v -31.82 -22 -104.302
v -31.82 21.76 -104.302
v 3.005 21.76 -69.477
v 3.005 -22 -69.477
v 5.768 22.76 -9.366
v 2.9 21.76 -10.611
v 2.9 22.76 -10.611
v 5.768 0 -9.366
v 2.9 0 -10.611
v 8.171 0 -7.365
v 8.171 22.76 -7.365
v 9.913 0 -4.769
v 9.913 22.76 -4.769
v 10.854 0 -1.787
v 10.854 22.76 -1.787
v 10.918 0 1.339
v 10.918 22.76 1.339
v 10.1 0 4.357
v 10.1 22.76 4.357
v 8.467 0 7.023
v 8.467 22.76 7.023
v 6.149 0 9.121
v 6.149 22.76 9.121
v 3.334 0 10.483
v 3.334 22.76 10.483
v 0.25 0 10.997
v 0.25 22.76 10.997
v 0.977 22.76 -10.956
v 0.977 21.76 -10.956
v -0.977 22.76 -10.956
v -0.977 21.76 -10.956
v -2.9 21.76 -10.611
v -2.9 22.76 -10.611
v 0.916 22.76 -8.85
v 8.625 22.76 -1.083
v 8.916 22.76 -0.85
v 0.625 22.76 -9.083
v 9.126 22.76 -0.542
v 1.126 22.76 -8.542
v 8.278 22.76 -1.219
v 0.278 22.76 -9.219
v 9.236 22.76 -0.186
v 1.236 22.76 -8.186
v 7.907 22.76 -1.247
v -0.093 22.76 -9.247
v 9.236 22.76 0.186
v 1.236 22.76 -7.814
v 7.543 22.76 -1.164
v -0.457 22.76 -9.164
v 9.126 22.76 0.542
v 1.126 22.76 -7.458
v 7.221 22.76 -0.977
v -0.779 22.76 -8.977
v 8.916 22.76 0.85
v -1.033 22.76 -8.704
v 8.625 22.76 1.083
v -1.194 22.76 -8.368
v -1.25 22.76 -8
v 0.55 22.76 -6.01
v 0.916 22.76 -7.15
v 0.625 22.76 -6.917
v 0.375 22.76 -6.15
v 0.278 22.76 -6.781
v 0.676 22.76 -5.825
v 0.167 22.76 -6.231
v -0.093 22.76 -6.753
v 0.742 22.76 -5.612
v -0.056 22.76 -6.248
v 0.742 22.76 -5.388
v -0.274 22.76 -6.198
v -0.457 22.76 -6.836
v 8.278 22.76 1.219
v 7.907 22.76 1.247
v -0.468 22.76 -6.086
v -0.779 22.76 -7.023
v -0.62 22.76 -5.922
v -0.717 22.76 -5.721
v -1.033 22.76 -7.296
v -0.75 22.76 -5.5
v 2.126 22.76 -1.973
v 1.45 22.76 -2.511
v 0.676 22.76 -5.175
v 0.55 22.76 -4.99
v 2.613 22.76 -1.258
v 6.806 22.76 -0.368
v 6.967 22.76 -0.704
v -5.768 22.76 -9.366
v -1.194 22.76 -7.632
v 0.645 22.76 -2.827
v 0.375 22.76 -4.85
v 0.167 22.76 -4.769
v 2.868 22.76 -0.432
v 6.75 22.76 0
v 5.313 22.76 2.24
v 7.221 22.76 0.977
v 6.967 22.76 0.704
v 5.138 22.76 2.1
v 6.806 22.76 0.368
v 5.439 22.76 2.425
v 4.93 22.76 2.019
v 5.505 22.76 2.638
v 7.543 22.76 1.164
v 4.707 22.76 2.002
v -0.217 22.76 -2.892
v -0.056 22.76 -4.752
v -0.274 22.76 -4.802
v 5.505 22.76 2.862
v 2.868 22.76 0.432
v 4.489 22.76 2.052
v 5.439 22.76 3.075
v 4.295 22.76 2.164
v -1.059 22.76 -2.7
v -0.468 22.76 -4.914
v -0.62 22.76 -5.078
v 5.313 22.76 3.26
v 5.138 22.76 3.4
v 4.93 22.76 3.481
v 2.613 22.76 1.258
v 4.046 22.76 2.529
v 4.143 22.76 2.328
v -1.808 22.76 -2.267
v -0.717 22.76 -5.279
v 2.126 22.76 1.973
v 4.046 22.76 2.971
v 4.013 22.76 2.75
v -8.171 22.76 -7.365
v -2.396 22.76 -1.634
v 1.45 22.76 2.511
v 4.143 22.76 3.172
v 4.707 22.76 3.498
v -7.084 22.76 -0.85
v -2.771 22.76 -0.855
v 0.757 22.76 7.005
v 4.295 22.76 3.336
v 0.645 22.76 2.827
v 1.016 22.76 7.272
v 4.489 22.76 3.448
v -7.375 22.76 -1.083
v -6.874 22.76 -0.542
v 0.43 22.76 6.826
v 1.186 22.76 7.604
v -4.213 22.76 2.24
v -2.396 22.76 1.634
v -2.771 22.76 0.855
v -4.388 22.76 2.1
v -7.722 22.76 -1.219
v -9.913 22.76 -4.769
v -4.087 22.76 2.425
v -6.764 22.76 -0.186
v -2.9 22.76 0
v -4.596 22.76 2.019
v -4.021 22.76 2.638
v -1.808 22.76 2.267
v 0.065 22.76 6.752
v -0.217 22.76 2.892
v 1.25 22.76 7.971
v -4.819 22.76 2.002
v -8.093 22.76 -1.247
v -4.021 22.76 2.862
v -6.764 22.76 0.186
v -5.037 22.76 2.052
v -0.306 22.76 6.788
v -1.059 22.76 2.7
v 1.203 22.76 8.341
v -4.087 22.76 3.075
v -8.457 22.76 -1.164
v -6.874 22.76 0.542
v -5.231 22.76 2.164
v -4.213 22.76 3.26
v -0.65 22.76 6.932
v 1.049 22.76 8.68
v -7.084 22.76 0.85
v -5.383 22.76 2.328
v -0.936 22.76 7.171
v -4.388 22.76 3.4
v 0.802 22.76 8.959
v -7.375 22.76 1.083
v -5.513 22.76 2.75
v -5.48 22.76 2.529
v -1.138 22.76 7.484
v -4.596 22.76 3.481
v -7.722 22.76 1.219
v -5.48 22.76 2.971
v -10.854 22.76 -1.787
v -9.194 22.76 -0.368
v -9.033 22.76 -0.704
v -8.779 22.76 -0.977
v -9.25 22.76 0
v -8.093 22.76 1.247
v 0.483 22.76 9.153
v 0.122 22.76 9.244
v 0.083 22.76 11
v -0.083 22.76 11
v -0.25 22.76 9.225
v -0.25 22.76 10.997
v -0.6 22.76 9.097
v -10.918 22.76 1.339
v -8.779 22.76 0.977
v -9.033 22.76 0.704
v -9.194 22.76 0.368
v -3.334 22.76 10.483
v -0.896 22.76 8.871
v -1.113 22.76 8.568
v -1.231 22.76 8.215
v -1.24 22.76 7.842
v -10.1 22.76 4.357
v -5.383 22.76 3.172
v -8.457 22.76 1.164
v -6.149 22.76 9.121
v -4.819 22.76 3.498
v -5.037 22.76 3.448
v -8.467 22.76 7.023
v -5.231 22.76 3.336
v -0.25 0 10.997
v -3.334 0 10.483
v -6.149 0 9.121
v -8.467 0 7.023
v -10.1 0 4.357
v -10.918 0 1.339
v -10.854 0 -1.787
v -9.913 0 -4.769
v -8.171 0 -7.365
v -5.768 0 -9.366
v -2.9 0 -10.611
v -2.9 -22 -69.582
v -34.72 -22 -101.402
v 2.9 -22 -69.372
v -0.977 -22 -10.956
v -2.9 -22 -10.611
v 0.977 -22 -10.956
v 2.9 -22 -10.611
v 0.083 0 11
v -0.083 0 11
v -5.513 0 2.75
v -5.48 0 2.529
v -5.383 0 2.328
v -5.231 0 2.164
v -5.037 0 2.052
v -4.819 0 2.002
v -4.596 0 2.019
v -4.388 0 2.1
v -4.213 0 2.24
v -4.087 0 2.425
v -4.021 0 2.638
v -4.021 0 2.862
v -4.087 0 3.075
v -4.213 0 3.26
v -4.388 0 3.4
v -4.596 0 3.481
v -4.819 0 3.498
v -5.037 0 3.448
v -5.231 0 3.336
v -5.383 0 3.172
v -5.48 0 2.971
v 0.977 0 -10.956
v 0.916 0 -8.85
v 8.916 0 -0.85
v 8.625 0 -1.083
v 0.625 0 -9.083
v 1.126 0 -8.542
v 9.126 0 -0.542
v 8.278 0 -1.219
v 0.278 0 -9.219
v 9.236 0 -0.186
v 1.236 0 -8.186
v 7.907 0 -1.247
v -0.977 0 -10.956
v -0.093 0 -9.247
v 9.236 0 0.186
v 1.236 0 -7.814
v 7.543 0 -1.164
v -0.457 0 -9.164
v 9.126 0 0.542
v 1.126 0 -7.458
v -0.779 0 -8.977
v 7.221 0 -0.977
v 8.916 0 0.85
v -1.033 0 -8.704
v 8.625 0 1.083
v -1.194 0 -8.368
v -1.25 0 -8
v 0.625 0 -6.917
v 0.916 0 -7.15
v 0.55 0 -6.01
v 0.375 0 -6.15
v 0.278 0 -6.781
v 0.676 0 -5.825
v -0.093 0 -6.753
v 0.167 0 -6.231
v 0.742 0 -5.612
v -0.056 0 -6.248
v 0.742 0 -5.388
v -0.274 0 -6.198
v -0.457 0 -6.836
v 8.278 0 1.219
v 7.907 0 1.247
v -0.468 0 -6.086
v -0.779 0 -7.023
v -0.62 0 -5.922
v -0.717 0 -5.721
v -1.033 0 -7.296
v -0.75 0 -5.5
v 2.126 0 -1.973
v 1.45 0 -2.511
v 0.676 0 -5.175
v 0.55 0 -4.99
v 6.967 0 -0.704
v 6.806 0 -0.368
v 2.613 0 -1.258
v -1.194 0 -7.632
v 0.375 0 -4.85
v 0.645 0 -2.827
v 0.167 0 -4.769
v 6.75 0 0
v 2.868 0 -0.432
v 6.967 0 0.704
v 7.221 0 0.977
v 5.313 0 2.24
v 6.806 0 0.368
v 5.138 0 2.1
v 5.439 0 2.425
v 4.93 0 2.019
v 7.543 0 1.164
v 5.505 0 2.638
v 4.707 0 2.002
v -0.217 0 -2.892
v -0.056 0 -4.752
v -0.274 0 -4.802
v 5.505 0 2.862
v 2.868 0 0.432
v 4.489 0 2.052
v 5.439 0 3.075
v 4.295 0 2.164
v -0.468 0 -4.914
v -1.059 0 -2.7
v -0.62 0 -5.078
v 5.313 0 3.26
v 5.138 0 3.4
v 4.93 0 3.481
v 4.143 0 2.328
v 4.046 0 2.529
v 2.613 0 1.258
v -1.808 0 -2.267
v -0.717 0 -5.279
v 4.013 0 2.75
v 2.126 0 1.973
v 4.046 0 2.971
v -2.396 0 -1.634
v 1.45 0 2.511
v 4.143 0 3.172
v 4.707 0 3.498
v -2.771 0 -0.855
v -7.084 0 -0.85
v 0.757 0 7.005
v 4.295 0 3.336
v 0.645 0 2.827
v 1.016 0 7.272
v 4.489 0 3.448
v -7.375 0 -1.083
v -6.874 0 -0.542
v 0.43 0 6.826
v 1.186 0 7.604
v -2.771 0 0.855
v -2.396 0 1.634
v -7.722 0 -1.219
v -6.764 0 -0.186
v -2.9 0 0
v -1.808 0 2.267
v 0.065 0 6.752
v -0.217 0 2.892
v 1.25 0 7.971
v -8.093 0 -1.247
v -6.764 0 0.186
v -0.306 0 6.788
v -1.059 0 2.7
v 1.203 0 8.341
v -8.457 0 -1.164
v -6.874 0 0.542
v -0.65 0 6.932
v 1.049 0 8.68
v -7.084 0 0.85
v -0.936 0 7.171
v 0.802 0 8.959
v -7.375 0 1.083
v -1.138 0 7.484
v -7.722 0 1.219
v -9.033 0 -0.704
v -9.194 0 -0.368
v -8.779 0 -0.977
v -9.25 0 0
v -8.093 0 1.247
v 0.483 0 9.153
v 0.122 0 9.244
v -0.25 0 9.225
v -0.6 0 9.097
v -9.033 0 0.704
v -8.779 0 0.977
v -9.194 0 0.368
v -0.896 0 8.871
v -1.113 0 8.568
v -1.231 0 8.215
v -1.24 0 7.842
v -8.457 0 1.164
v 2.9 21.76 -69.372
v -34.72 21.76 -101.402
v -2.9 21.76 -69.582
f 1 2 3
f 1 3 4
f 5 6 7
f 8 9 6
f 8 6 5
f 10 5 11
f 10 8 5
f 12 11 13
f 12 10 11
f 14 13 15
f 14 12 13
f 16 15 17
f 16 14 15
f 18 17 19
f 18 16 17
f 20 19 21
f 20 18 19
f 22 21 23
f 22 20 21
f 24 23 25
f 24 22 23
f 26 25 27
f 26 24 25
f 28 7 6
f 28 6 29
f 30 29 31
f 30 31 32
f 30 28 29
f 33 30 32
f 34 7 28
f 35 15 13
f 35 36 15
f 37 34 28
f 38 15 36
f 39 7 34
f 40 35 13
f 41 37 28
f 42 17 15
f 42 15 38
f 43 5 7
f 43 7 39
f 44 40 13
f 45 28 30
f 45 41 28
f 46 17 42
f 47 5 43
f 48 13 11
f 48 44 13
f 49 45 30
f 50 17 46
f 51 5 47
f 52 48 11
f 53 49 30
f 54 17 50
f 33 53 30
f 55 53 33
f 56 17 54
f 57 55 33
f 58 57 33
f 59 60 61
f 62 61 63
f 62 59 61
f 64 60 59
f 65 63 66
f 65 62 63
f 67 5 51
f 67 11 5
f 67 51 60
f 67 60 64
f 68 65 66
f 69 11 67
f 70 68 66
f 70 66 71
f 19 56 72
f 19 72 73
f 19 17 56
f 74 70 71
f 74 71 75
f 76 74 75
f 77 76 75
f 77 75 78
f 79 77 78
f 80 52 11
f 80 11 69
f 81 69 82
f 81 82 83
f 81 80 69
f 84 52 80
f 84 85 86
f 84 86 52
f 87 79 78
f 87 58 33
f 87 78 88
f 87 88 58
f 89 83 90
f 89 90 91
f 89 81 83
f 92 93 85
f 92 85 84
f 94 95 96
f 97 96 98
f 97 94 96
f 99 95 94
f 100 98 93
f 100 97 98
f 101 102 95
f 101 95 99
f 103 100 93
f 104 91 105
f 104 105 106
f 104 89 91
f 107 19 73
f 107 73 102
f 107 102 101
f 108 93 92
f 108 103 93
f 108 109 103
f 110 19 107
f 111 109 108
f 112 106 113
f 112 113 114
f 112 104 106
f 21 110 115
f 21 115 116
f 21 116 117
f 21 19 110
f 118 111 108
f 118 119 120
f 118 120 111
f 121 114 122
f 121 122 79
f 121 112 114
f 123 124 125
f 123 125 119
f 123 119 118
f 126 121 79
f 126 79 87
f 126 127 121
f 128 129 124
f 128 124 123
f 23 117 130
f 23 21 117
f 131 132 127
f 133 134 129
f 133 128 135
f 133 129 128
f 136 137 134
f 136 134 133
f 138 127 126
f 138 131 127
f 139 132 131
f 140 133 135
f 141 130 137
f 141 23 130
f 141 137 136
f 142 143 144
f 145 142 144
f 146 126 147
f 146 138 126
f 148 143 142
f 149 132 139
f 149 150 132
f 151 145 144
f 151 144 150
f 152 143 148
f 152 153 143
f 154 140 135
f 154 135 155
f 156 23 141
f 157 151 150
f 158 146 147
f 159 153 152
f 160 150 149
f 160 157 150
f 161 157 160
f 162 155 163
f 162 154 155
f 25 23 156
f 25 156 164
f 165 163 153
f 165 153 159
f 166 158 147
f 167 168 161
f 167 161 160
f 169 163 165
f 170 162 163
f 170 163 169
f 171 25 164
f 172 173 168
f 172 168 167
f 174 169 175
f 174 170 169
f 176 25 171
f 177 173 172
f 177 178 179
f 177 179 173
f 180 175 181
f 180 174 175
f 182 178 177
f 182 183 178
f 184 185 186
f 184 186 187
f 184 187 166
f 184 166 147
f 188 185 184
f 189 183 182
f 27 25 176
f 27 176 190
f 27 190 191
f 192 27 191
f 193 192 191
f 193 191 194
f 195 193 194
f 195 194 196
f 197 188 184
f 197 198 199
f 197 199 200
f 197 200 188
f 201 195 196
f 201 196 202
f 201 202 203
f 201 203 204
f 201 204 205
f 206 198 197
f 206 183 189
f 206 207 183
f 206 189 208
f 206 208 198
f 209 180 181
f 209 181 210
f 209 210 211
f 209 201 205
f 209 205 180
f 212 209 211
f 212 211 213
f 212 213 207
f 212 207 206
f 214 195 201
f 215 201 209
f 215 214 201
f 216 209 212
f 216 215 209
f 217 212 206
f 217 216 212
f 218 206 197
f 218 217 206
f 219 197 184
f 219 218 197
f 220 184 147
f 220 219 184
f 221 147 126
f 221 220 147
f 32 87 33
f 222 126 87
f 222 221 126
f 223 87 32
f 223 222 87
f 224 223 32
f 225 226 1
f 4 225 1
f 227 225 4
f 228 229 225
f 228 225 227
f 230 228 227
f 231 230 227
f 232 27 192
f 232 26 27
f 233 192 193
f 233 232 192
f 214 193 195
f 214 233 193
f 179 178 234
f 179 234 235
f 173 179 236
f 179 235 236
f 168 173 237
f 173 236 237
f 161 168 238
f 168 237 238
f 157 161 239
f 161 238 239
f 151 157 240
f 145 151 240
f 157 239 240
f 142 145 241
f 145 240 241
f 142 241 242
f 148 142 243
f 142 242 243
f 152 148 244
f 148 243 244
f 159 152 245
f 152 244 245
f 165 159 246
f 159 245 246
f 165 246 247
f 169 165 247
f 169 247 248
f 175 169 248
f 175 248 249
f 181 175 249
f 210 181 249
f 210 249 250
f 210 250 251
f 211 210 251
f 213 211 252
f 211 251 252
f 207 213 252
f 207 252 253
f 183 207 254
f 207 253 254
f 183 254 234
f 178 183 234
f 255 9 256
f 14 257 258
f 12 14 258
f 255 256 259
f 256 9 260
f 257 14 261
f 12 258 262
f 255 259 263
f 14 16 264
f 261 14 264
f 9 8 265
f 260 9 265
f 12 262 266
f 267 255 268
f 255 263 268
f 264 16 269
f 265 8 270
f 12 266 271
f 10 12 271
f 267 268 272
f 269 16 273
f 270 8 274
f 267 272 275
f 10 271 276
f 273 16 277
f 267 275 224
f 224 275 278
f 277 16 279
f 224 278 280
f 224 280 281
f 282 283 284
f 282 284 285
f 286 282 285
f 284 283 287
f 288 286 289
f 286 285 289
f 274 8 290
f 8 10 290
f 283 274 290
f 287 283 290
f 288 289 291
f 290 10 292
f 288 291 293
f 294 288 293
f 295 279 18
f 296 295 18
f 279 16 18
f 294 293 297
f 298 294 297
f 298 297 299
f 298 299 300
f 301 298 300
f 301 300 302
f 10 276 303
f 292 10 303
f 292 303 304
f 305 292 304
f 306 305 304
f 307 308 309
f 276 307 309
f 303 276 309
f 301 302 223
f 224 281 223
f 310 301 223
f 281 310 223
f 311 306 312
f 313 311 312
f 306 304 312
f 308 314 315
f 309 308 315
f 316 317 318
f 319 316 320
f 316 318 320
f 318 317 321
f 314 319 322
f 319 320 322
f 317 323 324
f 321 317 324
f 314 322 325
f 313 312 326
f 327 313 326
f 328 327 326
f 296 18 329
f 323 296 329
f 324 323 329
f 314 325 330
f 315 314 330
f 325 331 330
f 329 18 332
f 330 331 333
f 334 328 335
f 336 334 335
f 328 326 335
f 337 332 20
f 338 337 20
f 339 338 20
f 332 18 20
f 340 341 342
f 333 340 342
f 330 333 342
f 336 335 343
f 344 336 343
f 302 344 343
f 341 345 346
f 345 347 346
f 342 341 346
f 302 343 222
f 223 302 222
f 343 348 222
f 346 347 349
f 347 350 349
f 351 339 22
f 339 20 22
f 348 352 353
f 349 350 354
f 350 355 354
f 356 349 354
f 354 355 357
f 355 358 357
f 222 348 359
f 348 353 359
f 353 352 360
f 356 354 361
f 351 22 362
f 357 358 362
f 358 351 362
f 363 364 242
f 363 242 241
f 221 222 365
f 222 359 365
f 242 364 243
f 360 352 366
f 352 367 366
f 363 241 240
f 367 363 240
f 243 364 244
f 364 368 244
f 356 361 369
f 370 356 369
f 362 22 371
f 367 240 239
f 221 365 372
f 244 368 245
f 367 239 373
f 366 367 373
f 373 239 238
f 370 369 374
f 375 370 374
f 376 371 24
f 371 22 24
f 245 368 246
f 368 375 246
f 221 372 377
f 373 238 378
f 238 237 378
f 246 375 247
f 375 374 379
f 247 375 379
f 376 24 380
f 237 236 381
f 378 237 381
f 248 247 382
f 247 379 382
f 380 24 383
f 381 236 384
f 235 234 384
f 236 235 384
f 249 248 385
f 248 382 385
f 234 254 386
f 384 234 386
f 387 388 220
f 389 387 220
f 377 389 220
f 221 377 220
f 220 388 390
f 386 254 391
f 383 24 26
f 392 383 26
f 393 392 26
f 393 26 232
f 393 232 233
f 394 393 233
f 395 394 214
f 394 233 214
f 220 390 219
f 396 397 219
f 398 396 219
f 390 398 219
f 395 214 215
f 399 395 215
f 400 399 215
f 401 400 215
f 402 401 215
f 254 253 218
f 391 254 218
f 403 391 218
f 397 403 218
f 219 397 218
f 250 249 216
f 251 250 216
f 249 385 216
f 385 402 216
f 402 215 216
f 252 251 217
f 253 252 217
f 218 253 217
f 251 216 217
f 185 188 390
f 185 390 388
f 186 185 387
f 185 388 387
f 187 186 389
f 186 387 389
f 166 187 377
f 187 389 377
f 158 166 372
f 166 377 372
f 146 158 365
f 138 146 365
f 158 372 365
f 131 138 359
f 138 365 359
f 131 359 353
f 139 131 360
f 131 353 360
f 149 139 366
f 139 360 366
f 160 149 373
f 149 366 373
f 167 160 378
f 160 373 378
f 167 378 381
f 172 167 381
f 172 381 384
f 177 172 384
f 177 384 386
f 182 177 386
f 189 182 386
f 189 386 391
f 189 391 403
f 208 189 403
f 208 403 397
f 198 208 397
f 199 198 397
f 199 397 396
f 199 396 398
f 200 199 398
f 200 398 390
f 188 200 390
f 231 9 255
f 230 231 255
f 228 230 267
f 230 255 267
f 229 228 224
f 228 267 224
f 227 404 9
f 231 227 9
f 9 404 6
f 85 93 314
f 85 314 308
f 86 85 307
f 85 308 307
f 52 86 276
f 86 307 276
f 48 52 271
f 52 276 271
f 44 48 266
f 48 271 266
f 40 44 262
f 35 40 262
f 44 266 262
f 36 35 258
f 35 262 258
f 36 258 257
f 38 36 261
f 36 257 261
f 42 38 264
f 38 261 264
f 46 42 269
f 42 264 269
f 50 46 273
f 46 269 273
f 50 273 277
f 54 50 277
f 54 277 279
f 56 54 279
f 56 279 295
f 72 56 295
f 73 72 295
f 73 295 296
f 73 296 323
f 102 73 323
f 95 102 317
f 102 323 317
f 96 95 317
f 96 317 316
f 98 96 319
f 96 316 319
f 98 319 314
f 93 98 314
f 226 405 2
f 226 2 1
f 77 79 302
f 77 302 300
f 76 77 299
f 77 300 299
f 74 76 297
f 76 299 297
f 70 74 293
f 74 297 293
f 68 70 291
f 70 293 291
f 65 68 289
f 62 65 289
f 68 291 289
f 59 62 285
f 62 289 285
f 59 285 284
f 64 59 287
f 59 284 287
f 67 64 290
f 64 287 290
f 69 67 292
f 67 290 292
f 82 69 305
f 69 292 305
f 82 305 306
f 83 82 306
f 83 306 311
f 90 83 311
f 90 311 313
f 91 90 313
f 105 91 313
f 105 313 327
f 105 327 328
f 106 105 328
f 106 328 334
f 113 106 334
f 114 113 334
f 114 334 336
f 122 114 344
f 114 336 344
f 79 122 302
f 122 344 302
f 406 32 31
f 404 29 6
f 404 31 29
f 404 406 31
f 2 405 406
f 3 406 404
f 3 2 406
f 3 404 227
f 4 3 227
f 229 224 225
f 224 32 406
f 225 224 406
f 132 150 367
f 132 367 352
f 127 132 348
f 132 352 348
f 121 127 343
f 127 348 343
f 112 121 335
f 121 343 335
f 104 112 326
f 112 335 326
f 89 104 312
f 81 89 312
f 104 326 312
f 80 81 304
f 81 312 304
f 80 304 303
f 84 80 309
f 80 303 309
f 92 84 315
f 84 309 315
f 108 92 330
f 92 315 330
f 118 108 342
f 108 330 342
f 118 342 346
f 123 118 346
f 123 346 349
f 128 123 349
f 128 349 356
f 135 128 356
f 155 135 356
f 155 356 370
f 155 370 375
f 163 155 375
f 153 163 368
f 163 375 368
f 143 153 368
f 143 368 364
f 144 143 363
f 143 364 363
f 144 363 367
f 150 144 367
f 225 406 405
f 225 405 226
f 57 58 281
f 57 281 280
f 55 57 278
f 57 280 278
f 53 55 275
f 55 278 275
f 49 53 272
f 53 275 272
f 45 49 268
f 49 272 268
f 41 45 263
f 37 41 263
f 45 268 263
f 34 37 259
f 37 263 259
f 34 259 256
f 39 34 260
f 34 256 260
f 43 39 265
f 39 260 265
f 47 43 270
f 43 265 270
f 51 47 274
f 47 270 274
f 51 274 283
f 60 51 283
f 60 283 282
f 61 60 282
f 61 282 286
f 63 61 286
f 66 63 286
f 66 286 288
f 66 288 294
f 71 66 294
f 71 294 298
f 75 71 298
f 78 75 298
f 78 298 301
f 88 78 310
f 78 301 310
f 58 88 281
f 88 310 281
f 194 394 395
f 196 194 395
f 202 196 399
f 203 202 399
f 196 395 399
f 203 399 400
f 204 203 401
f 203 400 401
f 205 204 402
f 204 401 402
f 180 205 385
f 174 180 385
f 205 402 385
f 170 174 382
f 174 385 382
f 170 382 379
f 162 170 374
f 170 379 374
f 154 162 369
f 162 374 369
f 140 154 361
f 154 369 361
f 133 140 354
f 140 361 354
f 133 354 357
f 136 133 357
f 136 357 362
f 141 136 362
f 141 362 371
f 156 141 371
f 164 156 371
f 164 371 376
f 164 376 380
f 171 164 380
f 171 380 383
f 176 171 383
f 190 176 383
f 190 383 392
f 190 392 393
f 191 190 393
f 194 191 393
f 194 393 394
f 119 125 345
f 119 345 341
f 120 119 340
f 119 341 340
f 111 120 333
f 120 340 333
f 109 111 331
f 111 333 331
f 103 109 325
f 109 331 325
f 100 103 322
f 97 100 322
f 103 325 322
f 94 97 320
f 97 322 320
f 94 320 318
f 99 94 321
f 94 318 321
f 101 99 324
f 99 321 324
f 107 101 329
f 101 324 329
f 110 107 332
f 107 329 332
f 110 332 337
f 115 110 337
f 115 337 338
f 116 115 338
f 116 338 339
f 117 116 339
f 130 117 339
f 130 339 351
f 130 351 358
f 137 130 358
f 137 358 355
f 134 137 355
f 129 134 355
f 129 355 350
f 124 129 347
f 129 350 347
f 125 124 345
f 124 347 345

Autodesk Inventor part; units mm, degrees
ref_plane "YZ Plane" through (0, 0, 0) normal (1, 0, 0) x (0, 1, 0)
ref_plane "XZ Plane" through (0, 0, 0) normal (0, 1, 0) x (-1, 0, 0)
sketch "Эскиз1" plane through (0, 0, 0) normal (0, 1, 0) x (-1, 0, 0)
  arc A0 (-0.25, 9.2247) -> (0.25, 9.2247) centre (0, 8) ccw
  line L0 (-0.25, 10.9972) -> (-0.25, 9.2247)
  arc A1 (-0.25, 10.9972) -> (-1.1469, -10.94) centre (0, 0) ccw
  line L1 (-1.1469, -10.6297) -> (-1.1469, -10.94)
  line L2 (-0.8473, -10.6297) -> (-1.1469, -10.6297)
  line L3 (-0.8473, -10.9673) -> (-0.8473, -10.6297)
  arc A2 (-0.8473, -10.9673) -> (0.8535, -10.9668) centre (0, 0) ccw
  line L4 (0.8535, -10.6297) -> (0.8535, -10.9668)
  line L5 (1.1541, -10.6297) -> (0.8535, -10.6297)
  line L6 (1.1541, -10.9393) -> (1.1541, -10.6297)
  arc A3 (1.1541, -10.9393) -> (0.25, 10.9972) centre (0, 0) ccw
  line L7 (0.25, 9.2247) -> (0.25, 10.9972)
  circle A4 centre (8, 0) radius 1.25
  circle A5 centre (0, -8) radius 1.25
  circle A6 centre (-8, 0) radius 1.25
  circle A7 centre (0, -5.5) radius 0.75
  circle A8 centre (4.7631, 2.75) radius 0.75
  circle A9 centre (-4.7631, 2.75) radius 0.75
  circle A10 centre (0, 0) radius 2.9
  arc A11 (0.25, 9.2247) -> (-0.25, 9.2247) centre (0, 8) ccw
  circle A12 centre (0, 0) radius 11
extrude "Выдавливание1" add sketch "Эскиз1" along normal blind 22.76 contours A0 L7 A3 L6 L5 L4 A2 L3 L2 L1 A1 L0 | L0 A12 L7 A11 | L1 L2 L3 A12 | A12 L4 L5 L6
sketch "Эскиз2" plane through (0, 22.76, 0) normal (0, 1, 0) x (1, 0, 0)
  circle A0 centre (0, 0) radius 2.9 projected
  line L0 (-2.9, 0) -> (2.9, 0)
  line L1 (2.9, 0) -> (2.9, 19.5825)
  line L2 (2.9, 19.5825) -> (-2.9, 19.5825)
  line L3 (-2.9, 19.5825) -> (-2.9, 0)
  circle A1 centre (0, 0) radius 11 projected
  arc A2 (2.9, 10.6108) -> (-2.9, 10.6108) centre (0, 0) ccw
extrude "Выдавливание2" add sketch "Эскиз2" against normal blind 22.76 contours A1 L3 L2 L1
sketch "Эскиз3" plane through (0, 22.76, 0) normal (0, 1, 0) x (1, 0, 0)
  line L0 (2.9, 19.5825) -> (2.9, 10.6108) projected
  arc A0 (2.9, 10.6108) -> (-2.9, 10.6108) centre (0, 0) ccw
  line L1 (-2.9, 19.5825) -> (-2.9, 10.6108) projected
  line L2 (-2.9, 10.6108) -> (2.9, 10.6108)
  line L3 (2.9, 10.6108) -> (2.9, 19.5825)
  line L4 (2.9, 19.5825) -> (-2.9, 19.5825)
  line L5 (-2.9, 19.5825) -> (-2.9, 10.6108)
  point P0 (0, 0)
extrude "Выдавливание3" cut sketch "Эскиз3" against normal blind 1 contours L0 A0 L1 L4
sketch "Эскиз4" plane through (0, 0, 0) normal (0, -1, 0) x (1, 0, 0)
  arc A0 (-2.9, -10.6108) -> (2.9, -10.6108) centre (0, 0) ccw projected
  arc A1 (-2.9, -10.6108) -> (2.9, -10.6108) centre (0, 0) ccw
  line L0 (-2.9, -10.6108) -> (-2.9, -19.5825) projected
  line L1 (2.9, -10.6108) -> (-2.9, -10.6108)
  line L2 (-2.9, -10.6108) -> (-2.9, -19.5825)
  line L3 (-2.9, -19.5825) -> (2.9, -19.5825)
  line L4 (2.9, -19.5825) -> (2.9, -10.6108)
  point P0 (0, 0)
extrude "Выдавливание4" add sketch "Эскиз4" along normal blind 22 contours A0 L4 L3 L0
move faces "Перенос1" translate (0, 0, -50) faces at (-0.9667, 7.1733, -19.5825)
ref_plane "РабПлоскость1" through (-2.9, -22, -69.5825) normal (-0.7071068, 0, -0.7071068) x (0, -1, 0)
sketch "Эскиз5" plane through (-2.9, -22, -69.5825) normal (-0.7071068, 0, -0.7071068) x (0, -1, 0)
  line L0 (-43.76, 0) -> (0, 0) projected
  line L1 (-43.76, -4.1012) -> (-43.76, 37.598) projected
  line L2 (0, 0) -> (-43.76, 0)
  line L3 (-43.76, 0) -> (-43.76, -4.1012)
  line L4 (-43.76, -4.1012) -> (0, -4.1012)
  line L5 (0, -4.1012) -> (0, 0)
  point P0 (-22, 47.1516)
extrude "Выдавливание5" add sketch "Эскиз5" along normal blind 45 and the other way blind 4.25
properties part number "палец"
